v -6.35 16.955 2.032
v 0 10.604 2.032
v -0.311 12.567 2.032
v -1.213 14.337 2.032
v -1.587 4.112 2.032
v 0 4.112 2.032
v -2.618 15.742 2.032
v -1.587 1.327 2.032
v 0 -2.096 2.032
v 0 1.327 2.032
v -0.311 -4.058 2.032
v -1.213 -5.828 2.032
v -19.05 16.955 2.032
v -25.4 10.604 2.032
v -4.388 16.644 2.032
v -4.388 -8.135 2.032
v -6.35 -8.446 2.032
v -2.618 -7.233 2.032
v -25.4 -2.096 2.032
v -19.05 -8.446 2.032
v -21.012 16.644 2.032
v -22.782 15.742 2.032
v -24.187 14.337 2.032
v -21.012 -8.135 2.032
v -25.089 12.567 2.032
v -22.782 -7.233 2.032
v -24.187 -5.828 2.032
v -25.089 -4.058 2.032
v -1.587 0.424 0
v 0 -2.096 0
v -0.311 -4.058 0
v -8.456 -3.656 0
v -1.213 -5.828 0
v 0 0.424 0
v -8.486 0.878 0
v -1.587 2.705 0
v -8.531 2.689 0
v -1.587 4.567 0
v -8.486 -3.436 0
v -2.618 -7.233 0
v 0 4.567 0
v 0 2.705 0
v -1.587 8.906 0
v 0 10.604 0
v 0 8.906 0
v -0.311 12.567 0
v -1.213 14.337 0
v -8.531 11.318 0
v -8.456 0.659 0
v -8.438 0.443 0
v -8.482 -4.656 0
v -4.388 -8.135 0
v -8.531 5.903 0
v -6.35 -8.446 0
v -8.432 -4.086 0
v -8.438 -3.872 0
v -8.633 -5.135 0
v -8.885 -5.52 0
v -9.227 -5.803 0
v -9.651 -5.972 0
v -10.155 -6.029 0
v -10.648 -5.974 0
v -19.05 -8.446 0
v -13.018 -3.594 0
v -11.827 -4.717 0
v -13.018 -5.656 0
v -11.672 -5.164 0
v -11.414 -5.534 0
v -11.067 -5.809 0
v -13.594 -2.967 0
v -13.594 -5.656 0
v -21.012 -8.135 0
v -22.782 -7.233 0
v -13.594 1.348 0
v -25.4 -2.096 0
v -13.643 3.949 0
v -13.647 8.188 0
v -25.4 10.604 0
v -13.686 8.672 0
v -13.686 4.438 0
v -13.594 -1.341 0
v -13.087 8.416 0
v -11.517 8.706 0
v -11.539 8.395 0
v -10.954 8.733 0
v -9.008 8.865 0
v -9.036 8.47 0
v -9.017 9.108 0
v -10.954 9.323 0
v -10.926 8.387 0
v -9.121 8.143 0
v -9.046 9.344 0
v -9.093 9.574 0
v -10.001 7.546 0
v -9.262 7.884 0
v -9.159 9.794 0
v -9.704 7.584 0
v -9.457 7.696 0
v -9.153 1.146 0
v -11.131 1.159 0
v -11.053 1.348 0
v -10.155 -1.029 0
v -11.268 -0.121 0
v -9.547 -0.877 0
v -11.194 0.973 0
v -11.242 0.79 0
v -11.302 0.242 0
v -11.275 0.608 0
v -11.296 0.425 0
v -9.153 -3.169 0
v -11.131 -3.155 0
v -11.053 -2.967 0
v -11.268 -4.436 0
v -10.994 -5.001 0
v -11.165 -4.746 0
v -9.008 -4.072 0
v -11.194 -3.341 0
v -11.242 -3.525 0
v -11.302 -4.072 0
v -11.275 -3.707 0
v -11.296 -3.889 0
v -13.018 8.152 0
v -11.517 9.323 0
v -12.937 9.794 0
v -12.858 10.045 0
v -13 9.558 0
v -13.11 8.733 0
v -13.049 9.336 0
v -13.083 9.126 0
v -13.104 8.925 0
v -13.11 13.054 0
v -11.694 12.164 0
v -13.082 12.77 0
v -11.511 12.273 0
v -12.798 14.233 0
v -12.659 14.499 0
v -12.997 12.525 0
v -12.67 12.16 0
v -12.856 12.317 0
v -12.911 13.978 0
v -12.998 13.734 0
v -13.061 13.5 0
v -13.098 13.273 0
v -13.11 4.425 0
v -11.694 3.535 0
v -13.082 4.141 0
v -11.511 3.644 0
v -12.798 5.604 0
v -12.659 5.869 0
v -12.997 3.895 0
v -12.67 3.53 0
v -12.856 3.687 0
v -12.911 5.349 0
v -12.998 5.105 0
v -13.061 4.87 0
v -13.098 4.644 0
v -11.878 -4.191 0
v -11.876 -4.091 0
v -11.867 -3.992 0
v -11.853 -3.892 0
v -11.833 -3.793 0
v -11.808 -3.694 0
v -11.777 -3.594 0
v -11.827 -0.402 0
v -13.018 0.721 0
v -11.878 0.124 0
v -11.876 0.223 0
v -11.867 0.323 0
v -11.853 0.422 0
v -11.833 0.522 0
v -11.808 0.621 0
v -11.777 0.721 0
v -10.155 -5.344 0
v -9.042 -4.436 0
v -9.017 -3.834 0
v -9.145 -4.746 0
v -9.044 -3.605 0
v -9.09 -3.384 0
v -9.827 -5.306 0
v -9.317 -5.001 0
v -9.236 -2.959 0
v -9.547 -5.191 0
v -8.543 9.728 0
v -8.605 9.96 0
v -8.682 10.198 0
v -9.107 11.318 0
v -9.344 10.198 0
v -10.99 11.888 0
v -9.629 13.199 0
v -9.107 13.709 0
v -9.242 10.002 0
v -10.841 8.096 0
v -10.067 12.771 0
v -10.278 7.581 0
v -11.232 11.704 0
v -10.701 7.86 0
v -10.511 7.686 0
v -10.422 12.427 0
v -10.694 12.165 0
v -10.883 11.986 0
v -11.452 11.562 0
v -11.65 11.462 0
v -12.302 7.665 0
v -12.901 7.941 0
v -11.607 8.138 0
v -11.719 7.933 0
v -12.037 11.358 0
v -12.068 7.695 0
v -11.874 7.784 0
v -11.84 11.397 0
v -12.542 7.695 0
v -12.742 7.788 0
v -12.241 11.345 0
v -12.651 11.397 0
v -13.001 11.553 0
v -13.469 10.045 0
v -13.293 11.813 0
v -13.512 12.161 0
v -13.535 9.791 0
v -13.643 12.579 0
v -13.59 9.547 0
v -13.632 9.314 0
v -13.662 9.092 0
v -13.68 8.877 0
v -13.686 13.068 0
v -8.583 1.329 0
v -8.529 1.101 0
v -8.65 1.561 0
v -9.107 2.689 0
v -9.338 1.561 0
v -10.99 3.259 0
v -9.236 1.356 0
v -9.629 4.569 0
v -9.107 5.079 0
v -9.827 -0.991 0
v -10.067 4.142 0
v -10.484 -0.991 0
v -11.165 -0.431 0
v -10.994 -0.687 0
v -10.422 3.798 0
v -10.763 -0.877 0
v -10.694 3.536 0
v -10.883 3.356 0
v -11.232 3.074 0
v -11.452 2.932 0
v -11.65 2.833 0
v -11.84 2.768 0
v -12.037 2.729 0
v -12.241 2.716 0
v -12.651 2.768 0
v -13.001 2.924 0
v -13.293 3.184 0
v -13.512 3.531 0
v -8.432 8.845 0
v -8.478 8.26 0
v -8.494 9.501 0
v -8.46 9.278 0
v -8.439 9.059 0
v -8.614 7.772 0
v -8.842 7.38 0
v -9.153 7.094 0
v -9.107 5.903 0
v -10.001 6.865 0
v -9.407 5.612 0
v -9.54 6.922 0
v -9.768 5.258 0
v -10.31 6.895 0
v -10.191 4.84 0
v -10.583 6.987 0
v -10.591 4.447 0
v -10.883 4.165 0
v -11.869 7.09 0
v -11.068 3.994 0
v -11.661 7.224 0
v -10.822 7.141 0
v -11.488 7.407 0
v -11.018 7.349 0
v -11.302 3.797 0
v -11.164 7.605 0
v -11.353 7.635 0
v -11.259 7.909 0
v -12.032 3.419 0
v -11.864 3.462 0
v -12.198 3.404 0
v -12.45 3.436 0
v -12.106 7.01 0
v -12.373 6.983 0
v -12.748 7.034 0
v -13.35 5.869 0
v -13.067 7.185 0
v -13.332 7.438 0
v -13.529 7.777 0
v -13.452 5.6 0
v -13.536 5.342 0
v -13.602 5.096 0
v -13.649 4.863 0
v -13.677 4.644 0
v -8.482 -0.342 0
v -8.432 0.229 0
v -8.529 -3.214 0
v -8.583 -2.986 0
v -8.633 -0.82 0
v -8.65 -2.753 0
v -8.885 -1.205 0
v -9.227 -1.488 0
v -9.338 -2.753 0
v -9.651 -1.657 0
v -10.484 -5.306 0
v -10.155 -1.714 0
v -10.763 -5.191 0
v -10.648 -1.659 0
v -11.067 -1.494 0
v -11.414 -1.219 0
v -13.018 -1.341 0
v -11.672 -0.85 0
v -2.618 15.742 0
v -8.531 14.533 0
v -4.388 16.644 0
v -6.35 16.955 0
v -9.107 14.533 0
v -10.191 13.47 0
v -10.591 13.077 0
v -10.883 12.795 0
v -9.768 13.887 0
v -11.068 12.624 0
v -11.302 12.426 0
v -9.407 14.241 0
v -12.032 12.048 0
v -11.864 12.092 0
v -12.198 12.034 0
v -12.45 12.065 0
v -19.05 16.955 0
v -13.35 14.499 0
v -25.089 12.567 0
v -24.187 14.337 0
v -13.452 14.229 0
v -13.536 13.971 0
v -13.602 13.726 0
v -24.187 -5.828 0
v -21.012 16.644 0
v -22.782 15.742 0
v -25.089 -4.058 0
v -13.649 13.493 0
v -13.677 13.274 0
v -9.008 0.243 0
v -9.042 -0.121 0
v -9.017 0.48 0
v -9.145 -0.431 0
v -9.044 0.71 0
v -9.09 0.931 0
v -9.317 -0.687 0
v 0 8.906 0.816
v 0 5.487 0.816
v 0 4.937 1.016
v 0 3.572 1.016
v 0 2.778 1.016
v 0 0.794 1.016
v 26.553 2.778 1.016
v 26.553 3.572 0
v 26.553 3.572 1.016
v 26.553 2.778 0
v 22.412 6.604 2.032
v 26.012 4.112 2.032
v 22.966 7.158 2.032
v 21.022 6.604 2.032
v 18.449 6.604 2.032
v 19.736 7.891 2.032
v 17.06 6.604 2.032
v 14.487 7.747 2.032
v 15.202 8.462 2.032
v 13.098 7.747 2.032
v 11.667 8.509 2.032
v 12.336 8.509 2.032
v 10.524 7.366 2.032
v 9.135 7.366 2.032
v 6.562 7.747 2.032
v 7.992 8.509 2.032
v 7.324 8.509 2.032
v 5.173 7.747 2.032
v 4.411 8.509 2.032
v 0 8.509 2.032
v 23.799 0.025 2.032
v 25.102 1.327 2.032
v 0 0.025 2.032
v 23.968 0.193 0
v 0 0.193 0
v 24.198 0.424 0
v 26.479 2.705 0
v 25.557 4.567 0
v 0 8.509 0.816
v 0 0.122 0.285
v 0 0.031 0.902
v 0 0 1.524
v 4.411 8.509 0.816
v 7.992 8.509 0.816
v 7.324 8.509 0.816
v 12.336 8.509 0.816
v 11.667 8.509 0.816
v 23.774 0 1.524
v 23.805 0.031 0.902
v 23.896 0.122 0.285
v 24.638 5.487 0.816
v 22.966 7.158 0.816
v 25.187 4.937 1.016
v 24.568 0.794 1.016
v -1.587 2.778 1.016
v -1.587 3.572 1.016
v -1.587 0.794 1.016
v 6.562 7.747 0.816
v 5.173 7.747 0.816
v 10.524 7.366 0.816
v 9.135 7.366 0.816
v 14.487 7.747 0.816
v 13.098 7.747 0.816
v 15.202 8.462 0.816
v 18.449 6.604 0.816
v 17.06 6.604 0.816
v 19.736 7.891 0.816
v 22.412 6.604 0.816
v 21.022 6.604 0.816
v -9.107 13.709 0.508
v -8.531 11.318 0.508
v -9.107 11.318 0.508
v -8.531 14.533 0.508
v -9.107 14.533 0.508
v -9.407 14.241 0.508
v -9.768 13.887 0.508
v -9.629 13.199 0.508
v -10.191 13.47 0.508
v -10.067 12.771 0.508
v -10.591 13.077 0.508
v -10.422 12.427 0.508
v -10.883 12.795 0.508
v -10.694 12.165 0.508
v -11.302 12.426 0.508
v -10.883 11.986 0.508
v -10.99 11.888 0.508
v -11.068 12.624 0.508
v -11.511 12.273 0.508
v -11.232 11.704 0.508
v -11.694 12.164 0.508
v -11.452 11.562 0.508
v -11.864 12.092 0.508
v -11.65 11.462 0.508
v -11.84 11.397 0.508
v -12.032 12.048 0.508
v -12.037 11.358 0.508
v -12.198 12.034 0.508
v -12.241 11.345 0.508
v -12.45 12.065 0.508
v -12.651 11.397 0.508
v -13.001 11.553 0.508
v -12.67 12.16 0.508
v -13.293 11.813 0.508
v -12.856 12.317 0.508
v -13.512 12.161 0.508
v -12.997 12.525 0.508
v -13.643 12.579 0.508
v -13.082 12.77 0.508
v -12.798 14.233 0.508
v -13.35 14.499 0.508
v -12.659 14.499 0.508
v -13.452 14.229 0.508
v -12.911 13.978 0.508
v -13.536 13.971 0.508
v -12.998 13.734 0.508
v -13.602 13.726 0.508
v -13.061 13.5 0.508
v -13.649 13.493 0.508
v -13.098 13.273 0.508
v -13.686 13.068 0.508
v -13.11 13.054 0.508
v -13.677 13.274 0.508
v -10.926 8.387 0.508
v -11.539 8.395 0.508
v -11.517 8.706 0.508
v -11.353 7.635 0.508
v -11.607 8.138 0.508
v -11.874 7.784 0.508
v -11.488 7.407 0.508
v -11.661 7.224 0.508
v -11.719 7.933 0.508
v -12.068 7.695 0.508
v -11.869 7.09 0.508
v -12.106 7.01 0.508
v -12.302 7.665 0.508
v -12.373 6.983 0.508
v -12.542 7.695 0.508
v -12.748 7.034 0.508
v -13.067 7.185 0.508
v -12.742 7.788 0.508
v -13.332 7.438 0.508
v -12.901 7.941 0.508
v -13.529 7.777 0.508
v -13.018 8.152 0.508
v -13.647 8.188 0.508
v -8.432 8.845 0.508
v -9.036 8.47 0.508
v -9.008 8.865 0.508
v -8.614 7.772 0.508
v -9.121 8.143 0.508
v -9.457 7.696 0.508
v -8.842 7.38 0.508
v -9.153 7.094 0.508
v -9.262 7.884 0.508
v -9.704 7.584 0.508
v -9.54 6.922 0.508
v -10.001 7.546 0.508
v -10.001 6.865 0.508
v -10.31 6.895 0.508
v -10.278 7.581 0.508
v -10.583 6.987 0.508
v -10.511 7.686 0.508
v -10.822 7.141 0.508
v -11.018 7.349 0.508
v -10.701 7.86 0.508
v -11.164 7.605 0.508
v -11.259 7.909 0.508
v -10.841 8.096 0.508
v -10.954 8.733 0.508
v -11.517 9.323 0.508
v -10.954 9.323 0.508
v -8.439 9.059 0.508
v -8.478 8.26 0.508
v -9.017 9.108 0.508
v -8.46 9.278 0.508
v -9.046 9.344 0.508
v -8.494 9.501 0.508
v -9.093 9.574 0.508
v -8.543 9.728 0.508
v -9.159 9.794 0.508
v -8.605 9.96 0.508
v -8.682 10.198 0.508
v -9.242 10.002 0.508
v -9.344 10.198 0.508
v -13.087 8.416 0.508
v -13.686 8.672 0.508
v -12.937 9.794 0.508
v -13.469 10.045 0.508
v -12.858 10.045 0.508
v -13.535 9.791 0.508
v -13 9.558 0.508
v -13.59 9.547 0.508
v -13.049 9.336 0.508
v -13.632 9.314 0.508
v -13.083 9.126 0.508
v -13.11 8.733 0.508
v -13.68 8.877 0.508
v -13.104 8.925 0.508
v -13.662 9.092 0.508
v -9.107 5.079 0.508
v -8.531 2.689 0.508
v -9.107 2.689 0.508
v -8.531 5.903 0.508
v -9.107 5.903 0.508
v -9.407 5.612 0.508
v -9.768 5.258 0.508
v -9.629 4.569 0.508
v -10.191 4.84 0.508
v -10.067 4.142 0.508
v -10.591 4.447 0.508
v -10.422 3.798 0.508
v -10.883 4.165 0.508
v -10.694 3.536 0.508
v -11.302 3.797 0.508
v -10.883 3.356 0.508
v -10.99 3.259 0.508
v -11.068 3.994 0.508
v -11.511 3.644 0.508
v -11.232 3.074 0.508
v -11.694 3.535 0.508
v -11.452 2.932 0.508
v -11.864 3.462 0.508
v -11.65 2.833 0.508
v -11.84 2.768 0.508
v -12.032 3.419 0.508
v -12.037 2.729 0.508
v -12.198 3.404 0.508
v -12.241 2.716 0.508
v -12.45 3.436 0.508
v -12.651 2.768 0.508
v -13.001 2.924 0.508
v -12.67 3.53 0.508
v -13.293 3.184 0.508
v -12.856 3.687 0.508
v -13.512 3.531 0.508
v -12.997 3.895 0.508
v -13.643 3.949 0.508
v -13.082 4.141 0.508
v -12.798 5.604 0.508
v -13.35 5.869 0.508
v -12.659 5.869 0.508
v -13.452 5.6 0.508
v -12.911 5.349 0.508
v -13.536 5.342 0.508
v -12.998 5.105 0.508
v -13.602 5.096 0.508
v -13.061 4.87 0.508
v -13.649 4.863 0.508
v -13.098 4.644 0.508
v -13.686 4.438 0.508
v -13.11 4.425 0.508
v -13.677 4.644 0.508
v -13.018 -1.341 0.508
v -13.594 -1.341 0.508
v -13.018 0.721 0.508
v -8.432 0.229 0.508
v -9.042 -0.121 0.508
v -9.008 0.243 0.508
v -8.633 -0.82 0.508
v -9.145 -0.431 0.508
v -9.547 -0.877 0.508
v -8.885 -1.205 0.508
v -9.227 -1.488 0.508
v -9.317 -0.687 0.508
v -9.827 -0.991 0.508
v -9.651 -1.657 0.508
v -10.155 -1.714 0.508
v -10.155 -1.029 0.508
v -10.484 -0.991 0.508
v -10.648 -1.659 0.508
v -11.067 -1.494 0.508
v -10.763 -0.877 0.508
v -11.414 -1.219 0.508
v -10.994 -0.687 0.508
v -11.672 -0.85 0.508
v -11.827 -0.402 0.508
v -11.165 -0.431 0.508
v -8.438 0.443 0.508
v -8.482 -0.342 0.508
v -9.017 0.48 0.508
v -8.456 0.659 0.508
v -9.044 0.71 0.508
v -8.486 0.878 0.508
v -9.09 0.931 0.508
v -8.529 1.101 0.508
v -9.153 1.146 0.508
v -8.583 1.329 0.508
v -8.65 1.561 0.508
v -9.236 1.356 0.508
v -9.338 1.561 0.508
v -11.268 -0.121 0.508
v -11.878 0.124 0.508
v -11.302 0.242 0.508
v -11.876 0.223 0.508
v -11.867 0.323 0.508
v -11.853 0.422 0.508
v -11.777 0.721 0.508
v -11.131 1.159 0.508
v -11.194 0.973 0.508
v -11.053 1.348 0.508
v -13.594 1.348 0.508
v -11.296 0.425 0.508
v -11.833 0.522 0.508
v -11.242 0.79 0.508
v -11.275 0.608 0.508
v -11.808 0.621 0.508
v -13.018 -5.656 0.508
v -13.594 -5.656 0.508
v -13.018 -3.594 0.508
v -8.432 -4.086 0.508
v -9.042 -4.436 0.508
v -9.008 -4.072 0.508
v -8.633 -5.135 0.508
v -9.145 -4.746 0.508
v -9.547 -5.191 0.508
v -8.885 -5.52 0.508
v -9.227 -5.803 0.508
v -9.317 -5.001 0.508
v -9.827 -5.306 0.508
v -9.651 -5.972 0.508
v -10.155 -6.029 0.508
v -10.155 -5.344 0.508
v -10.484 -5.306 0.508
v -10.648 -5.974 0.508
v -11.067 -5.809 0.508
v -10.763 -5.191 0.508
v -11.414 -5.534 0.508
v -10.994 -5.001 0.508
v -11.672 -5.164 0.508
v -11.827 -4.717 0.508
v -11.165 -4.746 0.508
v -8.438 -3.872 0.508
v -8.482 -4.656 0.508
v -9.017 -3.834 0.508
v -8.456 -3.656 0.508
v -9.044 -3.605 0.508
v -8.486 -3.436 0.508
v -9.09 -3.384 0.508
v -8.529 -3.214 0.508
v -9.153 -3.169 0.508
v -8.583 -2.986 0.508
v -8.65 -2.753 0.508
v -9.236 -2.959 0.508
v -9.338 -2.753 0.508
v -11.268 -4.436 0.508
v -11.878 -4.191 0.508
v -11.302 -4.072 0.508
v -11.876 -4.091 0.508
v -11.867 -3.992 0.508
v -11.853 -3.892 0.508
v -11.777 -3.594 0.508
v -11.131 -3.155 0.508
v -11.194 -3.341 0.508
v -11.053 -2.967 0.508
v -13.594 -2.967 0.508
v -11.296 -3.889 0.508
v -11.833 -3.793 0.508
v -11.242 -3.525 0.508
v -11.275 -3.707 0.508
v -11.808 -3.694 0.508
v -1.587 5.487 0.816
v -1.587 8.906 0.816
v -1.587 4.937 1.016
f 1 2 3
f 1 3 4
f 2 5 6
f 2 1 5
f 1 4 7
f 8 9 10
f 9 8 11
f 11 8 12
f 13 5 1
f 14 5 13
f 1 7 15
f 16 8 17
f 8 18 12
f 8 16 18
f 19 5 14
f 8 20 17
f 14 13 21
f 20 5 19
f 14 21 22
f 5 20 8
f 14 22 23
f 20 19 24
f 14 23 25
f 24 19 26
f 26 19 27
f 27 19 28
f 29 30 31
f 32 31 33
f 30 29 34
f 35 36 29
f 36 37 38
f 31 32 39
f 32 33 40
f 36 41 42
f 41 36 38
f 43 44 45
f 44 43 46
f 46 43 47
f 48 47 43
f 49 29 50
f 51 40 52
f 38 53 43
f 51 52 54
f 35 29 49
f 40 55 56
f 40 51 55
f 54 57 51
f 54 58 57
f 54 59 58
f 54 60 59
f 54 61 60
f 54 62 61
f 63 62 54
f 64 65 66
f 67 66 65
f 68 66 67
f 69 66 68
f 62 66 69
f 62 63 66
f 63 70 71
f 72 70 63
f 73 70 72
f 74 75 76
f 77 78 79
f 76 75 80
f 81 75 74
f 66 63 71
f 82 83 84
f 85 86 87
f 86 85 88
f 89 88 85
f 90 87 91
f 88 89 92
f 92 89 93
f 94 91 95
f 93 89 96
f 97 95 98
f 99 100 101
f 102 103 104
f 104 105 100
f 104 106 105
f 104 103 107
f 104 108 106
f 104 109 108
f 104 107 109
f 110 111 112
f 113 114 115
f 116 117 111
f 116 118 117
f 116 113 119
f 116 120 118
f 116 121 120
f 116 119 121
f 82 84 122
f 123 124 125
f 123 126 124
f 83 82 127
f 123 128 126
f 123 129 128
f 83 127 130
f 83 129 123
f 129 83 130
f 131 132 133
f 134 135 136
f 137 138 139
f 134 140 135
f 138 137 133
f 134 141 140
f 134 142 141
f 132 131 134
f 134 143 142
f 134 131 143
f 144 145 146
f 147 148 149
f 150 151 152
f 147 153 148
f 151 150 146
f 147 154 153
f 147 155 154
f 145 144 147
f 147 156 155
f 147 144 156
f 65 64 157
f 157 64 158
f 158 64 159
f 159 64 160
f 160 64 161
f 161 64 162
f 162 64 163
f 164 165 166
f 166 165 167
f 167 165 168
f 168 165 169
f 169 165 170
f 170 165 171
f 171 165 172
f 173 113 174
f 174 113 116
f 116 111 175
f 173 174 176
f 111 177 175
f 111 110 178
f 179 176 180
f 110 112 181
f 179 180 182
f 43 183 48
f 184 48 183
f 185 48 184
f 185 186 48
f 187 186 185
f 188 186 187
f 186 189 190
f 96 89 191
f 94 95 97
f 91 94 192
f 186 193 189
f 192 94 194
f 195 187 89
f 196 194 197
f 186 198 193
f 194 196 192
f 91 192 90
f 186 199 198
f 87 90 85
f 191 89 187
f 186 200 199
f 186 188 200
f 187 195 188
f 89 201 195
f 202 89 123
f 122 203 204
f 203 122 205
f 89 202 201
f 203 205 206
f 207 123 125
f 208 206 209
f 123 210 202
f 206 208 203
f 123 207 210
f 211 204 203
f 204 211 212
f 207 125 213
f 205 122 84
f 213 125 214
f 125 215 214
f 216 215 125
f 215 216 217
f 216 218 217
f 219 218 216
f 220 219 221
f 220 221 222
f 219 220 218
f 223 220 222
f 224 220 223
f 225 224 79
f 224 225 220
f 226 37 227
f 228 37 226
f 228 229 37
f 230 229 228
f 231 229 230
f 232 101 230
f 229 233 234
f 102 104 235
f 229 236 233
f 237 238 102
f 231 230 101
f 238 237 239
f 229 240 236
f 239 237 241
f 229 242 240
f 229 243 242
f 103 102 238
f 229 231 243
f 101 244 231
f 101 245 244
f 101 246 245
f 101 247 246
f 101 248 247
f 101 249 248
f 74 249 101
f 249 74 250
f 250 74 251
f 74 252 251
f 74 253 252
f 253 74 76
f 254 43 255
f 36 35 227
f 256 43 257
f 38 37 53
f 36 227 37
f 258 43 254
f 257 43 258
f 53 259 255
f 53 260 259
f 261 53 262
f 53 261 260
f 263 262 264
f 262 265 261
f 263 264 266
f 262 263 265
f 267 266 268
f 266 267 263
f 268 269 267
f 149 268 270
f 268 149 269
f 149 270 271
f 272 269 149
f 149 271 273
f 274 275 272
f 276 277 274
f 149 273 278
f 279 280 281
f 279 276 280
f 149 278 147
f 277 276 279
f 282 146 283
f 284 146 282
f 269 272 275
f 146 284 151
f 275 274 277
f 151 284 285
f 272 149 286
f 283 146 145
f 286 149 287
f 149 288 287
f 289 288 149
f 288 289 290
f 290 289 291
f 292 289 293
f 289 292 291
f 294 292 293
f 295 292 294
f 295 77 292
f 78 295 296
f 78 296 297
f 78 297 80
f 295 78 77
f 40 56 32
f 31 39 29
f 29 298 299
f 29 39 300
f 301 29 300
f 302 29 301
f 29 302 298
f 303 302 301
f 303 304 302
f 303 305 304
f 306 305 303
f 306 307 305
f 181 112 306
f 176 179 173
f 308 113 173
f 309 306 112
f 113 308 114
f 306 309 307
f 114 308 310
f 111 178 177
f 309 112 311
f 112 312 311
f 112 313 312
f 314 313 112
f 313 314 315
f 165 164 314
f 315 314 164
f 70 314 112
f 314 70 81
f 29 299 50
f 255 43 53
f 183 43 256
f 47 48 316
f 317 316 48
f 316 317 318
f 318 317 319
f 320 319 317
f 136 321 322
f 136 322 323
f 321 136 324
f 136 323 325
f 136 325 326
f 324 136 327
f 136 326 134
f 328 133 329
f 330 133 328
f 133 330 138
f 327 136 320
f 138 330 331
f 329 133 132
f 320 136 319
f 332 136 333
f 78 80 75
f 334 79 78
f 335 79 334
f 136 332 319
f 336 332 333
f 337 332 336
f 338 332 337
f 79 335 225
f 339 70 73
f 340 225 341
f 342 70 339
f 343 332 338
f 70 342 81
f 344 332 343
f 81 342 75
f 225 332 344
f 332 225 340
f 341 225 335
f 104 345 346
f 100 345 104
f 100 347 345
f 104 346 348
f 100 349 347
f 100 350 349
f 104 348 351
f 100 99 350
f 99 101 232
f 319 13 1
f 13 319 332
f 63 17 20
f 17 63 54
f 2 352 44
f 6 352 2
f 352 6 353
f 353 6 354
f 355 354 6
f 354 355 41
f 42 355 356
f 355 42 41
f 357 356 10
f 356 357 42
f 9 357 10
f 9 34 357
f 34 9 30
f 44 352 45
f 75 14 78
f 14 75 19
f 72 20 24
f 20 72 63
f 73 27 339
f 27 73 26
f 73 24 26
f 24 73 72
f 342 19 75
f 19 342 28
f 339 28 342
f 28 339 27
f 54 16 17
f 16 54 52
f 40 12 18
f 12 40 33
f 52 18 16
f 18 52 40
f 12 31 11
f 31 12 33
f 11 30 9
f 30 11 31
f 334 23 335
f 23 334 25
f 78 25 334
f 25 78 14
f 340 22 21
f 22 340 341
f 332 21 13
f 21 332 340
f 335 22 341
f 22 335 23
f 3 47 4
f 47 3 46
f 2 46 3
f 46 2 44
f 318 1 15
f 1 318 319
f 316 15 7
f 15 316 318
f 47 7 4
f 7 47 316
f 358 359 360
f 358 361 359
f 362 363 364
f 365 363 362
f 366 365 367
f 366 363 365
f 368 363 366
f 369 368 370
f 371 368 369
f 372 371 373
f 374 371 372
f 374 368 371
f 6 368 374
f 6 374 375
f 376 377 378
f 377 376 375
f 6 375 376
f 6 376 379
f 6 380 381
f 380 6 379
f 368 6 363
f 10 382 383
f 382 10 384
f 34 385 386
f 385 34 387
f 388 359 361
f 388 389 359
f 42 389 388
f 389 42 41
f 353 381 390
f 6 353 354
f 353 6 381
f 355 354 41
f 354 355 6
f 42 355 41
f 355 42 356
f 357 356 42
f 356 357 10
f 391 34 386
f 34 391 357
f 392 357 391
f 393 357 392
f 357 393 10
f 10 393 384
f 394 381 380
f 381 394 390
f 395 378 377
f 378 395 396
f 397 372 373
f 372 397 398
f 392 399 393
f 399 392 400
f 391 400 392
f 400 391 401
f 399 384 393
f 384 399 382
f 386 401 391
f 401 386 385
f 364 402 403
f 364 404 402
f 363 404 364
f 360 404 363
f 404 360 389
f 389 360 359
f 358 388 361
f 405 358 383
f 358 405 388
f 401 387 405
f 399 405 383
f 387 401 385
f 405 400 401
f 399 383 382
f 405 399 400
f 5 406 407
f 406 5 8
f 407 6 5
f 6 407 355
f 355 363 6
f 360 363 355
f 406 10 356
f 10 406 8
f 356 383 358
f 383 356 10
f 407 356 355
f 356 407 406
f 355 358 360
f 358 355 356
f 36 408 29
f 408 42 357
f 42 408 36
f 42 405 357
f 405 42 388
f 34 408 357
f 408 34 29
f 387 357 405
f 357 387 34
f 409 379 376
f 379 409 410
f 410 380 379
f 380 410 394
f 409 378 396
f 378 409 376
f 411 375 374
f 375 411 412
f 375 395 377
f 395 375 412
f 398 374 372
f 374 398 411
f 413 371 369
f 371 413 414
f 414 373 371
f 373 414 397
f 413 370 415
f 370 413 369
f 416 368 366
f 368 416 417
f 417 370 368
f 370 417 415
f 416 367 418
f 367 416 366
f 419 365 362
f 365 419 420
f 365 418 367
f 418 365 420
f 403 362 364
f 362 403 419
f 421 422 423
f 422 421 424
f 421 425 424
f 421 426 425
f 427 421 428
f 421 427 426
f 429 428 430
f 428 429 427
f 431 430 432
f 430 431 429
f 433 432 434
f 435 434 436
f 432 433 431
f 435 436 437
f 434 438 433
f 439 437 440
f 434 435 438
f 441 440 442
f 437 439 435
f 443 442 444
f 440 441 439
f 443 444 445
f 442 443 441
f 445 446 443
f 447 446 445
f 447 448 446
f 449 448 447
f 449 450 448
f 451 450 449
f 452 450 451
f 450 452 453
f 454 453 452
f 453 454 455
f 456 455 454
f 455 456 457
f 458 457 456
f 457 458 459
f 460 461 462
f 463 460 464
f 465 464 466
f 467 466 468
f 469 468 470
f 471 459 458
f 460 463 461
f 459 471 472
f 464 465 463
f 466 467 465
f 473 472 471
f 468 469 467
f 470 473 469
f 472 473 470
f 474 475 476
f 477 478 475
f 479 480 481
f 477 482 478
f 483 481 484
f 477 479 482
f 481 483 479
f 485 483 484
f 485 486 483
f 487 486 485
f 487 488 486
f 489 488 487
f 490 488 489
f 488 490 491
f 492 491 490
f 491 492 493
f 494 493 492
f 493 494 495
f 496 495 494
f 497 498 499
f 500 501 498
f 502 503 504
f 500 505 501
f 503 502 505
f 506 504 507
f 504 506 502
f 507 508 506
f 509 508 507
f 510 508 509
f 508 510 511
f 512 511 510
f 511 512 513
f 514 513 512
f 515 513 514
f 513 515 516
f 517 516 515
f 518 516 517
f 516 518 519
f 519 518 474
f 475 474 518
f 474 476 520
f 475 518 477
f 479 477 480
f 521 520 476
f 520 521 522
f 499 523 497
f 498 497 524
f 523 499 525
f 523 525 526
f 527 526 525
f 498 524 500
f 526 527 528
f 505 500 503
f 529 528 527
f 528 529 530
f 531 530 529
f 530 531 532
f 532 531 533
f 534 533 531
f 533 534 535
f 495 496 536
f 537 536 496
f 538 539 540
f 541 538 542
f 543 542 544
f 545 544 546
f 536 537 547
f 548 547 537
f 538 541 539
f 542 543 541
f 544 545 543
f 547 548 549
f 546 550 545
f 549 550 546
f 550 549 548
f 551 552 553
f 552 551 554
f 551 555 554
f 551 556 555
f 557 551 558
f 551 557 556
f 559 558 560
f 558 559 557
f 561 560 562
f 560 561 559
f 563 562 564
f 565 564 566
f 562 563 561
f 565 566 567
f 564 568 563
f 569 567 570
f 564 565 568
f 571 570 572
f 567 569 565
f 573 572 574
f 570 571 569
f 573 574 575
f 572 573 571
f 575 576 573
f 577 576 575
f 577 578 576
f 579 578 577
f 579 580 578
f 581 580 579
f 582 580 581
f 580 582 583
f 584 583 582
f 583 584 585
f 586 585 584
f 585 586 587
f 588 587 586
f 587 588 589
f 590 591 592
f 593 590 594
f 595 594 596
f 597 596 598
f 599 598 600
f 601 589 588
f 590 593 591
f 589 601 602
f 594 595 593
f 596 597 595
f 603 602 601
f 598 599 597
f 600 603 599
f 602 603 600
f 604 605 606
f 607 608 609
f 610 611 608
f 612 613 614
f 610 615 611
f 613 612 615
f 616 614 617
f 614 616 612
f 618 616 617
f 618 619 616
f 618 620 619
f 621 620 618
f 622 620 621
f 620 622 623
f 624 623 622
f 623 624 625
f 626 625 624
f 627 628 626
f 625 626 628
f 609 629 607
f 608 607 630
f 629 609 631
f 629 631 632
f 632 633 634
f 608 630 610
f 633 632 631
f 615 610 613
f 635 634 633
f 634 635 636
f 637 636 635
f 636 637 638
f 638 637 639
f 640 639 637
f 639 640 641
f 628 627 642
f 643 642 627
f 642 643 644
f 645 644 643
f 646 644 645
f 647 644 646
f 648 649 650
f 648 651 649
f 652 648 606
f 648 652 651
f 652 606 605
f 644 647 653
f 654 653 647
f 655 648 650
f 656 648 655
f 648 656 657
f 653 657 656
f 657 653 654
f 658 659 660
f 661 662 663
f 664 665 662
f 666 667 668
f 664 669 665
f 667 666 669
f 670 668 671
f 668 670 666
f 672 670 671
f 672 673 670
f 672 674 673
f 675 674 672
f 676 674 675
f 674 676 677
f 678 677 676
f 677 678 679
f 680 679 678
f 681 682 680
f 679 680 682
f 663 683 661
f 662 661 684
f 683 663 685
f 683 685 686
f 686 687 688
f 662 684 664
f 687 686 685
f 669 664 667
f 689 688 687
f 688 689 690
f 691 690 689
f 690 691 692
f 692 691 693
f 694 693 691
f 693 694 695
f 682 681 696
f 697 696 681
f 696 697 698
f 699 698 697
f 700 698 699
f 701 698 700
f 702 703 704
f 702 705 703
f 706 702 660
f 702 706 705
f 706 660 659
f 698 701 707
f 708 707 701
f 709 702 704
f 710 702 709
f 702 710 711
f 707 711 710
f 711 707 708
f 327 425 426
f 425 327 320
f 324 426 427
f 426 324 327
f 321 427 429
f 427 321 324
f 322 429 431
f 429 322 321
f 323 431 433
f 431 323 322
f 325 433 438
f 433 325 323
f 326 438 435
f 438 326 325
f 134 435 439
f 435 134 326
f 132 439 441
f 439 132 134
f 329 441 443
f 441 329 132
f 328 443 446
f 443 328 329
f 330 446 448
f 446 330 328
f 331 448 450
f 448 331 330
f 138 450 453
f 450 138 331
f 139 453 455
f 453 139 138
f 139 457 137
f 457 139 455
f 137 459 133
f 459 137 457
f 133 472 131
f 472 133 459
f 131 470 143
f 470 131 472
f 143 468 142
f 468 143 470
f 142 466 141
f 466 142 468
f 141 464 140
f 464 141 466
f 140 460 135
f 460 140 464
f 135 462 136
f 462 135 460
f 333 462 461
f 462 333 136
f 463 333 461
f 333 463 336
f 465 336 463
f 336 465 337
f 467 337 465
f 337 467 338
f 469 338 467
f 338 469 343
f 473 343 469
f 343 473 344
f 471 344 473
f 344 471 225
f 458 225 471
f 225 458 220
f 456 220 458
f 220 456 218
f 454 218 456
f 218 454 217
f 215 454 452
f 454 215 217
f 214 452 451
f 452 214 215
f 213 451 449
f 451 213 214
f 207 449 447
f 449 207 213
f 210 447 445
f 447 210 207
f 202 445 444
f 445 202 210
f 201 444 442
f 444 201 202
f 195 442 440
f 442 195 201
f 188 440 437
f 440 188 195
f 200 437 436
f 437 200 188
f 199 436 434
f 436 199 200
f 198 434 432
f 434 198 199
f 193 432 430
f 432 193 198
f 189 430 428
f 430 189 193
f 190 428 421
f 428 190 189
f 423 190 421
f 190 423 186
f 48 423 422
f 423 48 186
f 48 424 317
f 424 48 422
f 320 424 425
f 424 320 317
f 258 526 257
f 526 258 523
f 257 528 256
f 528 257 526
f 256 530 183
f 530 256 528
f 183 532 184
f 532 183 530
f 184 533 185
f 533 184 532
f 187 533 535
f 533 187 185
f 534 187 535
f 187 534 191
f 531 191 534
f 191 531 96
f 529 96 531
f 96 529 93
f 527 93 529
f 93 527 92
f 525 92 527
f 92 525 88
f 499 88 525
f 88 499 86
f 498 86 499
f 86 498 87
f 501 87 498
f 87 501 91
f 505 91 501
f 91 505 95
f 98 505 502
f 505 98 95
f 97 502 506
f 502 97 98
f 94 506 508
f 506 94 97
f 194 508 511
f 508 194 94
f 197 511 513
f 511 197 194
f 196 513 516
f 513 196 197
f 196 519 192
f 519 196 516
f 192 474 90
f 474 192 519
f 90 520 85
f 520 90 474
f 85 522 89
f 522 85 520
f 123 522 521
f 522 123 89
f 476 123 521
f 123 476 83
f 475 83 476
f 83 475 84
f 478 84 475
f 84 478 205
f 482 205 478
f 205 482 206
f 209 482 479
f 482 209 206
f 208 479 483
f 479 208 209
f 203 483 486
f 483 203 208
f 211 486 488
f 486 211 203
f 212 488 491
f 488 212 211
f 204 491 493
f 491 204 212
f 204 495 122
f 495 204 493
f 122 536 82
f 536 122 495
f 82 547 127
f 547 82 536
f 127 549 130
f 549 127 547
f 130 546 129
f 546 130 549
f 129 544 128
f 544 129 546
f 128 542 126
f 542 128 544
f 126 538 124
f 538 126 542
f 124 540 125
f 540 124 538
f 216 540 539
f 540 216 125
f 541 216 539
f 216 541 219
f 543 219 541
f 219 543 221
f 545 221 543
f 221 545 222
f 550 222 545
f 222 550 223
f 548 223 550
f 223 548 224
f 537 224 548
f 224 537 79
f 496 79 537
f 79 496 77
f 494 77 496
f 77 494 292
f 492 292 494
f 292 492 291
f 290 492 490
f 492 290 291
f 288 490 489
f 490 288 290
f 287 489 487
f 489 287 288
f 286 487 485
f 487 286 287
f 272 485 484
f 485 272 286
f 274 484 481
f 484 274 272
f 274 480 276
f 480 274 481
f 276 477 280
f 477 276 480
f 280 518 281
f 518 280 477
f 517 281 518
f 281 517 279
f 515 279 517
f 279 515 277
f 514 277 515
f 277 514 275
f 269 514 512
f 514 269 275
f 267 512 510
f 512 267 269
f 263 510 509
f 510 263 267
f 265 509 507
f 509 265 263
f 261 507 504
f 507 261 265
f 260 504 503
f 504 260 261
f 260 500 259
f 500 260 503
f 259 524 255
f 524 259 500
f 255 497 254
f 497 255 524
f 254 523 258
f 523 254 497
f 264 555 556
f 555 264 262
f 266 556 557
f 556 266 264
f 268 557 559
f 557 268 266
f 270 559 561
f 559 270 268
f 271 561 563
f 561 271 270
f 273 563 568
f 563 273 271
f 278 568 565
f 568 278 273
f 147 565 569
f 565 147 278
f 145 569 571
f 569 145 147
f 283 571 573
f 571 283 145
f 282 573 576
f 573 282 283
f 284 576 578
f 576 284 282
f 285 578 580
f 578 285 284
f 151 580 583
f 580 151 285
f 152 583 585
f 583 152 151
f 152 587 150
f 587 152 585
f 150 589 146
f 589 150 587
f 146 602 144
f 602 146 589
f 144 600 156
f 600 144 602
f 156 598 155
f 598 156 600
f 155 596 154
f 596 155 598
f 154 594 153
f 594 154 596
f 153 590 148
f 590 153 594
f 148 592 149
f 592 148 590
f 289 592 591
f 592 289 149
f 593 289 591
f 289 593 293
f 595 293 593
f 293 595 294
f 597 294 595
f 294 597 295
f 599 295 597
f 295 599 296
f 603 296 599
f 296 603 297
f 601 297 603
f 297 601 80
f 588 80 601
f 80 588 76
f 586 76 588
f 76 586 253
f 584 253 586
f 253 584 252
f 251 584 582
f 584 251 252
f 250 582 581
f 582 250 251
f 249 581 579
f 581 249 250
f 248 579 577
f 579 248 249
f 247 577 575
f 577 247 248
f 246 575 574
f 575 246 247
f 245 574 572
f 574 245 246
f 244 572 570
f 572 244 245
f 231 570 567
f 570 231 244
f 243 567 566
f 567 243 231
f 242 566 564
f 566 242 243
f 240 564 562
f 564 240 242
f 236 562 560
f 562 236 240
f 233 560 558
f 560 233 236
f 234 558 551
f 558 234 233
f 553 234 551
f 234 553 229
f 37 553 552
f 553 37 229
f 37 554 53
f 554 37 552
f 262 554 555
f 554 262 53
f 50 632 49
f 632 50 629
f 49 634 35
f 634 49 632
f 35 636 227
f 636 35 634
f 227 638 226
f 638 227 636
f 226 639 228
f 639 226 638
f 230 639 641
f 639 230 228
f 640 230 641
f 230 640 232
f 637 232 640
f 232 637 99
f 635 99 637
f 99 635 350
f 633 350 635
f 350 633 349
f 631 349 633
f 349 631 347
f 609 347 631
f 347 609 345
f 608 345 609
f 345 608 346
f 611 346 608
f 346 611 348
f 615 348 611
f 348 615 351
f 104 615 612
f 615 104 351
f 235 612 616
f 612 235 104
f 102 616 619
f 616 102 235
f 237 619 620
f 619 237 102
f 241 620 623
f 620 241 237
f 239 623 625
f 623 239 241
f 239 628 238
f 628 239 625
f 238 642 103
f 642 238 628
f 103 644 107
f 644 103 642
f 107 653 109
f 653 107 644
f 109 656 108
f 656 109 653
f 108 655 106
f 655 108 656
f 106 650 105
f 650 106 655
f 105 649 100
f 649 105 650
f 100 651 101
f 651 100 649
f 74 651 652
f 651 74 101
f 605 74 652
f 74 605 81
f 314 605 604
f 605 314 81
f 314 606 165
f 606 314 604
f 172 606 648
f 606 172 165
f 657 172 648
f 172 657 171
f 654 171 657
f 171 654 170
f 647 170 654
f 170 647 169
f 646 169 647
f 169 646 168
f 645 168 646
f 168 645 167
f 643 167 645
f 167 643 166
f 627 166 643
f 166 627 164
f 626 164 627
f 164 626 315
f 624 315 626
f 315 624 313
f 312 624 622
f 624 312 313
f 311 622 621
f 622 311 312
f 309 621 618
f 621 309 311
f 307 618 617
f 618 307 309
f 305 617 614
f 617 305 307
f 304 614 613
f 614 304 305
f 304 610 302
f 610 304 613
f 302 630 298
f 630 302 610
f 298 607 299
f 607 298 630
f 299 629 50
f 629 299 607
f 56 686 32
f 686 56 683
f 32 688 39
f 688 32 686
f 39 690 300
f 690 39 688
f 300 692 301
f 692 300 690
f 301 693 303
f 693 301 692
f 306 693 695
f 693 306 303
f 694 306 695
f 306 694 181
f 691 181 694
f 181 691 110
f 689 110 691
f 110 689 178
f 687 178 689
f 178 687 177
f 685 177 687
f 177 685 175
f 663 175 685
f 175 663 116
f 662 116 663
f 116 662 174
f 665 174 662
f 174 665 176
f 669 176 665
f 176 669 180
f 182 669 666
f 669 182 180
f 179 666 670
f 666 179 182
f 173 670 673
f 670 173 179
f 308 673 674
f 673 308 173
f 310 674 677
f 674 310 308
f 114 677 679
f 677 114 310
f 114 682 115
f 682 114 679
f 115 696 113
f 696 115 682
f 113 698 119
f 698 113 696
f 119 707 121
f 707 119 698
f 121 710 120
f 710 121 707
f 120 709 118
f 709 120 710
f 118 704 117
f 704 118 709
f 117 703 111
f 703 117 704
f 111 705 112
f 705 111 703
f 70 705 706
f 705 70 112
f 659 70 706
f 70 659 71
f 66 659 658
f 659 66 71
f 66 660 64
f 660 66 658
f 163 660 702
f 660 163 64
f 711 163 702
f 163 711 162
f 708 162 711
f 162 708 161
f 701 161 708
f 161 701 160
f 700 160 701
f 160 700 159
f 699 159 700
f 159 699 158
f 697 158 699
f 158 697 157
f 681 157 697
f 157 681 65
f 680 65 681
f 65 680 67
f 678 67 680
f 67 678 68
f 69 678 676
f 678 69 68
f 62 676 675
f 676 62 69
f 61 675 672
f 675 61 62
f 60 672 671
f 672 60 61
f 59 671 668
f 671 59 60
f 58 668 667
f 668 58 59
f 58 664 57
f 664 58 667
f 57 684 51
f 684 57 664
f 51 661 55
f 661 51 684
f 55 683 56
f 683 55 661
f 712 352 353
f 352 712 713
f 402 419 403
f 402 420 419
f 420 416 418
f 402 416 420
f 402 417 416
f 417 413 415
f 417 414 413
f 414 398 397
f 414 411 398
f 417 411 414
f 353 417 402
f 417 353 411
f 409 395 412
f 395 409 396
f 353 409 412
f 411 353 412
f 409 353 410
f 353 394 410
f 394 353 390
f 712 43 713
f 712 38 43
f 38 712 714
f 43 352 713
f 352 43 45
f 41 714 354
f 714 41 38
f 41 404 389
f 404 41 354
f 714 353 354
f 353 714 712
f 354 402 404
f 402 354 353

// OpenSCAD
//(this is just a reference table to help pick cuts below)
//0 = .335",1:1 = .320",2:2 = .305",3:3 = .290",4:4 = .275",5:5 = .260",6:6 = .245",7:7 = .230",8:8 = .215",9:9 = .200"]

//cuts are ordered the same as Schlage key codes
//(cut at the handle of key)
cut_1 = 2; 
cut_2 = 3;
cut_3 = 2; 
cut_4 = 5; 
cut_5 = 5; 
//(cut at the tip of key)

//Print label
keycode=1; 

function mm(i) = i*25.4;

module handle(size, r) {
  union() {
    translate([r, 0, 0]) cube([size[0]-2*r, size[1], size[2]]);
    translate([0, r, 0]) cube([size[0], size[1]-2*r, size[2]]);
    translate([r, r, 0]) cylinder(h=size[2], r=r);
    translate([size[0]-r, r, 0]) cylinder(h=size[2], r=r);
    translate([r, size[1]-r, 0]) cylinder(h=size[2], r=r);
    translate([size[0]-r, size[1]-r, 0]) cylinder(h=size[2], r=r);
  }
}

module bit() {
  w = mm(1/4);
  difference() {
    translate([-w/2, 0, 0]) cube([w, mm(1), w]);
    translate([-mm(7/256), 0, 0]) rotate([0, 0, 135]) cube([w, w, w]);
    translate([mm(7/256), 0, 0]) rotate([0, 0, -45]) cube([w, w, w]);
  }
}

// Schlage SC1 5 pin key.
module sc1(bits) {
  thickness = mm(0.080);
  width = mm(.335);
  shoulder = mm(.231);
  pin_spacing = mm(.156);
  depth_inc = mm(.015);
  tiplength = mm(.05);
  //length = mm(17/16);
  length = shoulder + 5 * pin_spacing + tiplength;

  
  // Handle size
  h_l = mm(1);
  h_w = mm(1);
  h_d = mm(1/16);
  difference() {
    // blade and key handle
    union() {
      translate([-h_l, -h_w/2 + width/2, 0]) handle([h_l, h_w, thickness], mm(1/4));
      intersection() {
        // cut a little off the tip to avoid going too long
        cube([length - mm(1/64), width, thickness]);
        translate([0, mm(1/4), thickness*3/4]) rotate([0, 90, 0]) cylinder(h=length, r=mm(1/4), $fn=64);
      }
    }
    
    // chamfer the tip
    translate([length, mm(1/8), 0]) {
      rotate([0, 0, 45]) cube([10, 10, thickness]);
      rotate([0, 0, 225]) cube([10, 10, thickness]);
    }
 
    // Keycode
    if (keycode==1){
        translate([-11,width/2, mm(-0.060)]) {
            linear_extrude(height=mm(0.080)) rotate([0,0,90]) scale([-1, 1, 1]) text(str(cut_1, cut_2, cut_3, cut_4, cut_5), font="Calibri-Bold", direction="ltr", halign="center", valign="center", size=5);
            }
    }  


    // cut the channels in the key.
    union() {
      translate([-h_d, mm(9/64), thickness/2]) rotate([62, 0, 0]) cube([length + h_d, width, width]);
      translate([-h_d, mm(7/64), thickness/2]) rotate([55, 0, 0]) cube([length + h_d, width, width]);
      translate([-h_d, mm(7/64), thickness/2]) cube([length + h_d, mm(1/32), width]);
    }
    
    translate([-h_d, width - mm(9/64), -0.2]) cube([length + h_d, width - (width - mm(10/64)), thickness/2]);
    translate([-h_d, width - mm(9/64), thickness/2]) rotate([-110, 0, 0]) cube([length + h_d, width, thickness/2]);
    
    intersection() {
      translate([-h_d, mm(1/32), thickness/2]) rotate([-118, 0, 0]) cube([length + h_d, width, width]);
      translate([-h_d, mm(1/32), thickness/2]) rotate([-110, 0, 0]) cube([length + h_d, width, width]);
    }
    
    // Do the actual bitting
    for (b = [0:4]) {
      translate([shoulder + b*pin_spacing, width - bits[b]*depth_inc, 0]) bit();
    }
  }
}
//Create the key
sc1([cut_1,cut_2,cut_3,cut_4,cut_5]);
